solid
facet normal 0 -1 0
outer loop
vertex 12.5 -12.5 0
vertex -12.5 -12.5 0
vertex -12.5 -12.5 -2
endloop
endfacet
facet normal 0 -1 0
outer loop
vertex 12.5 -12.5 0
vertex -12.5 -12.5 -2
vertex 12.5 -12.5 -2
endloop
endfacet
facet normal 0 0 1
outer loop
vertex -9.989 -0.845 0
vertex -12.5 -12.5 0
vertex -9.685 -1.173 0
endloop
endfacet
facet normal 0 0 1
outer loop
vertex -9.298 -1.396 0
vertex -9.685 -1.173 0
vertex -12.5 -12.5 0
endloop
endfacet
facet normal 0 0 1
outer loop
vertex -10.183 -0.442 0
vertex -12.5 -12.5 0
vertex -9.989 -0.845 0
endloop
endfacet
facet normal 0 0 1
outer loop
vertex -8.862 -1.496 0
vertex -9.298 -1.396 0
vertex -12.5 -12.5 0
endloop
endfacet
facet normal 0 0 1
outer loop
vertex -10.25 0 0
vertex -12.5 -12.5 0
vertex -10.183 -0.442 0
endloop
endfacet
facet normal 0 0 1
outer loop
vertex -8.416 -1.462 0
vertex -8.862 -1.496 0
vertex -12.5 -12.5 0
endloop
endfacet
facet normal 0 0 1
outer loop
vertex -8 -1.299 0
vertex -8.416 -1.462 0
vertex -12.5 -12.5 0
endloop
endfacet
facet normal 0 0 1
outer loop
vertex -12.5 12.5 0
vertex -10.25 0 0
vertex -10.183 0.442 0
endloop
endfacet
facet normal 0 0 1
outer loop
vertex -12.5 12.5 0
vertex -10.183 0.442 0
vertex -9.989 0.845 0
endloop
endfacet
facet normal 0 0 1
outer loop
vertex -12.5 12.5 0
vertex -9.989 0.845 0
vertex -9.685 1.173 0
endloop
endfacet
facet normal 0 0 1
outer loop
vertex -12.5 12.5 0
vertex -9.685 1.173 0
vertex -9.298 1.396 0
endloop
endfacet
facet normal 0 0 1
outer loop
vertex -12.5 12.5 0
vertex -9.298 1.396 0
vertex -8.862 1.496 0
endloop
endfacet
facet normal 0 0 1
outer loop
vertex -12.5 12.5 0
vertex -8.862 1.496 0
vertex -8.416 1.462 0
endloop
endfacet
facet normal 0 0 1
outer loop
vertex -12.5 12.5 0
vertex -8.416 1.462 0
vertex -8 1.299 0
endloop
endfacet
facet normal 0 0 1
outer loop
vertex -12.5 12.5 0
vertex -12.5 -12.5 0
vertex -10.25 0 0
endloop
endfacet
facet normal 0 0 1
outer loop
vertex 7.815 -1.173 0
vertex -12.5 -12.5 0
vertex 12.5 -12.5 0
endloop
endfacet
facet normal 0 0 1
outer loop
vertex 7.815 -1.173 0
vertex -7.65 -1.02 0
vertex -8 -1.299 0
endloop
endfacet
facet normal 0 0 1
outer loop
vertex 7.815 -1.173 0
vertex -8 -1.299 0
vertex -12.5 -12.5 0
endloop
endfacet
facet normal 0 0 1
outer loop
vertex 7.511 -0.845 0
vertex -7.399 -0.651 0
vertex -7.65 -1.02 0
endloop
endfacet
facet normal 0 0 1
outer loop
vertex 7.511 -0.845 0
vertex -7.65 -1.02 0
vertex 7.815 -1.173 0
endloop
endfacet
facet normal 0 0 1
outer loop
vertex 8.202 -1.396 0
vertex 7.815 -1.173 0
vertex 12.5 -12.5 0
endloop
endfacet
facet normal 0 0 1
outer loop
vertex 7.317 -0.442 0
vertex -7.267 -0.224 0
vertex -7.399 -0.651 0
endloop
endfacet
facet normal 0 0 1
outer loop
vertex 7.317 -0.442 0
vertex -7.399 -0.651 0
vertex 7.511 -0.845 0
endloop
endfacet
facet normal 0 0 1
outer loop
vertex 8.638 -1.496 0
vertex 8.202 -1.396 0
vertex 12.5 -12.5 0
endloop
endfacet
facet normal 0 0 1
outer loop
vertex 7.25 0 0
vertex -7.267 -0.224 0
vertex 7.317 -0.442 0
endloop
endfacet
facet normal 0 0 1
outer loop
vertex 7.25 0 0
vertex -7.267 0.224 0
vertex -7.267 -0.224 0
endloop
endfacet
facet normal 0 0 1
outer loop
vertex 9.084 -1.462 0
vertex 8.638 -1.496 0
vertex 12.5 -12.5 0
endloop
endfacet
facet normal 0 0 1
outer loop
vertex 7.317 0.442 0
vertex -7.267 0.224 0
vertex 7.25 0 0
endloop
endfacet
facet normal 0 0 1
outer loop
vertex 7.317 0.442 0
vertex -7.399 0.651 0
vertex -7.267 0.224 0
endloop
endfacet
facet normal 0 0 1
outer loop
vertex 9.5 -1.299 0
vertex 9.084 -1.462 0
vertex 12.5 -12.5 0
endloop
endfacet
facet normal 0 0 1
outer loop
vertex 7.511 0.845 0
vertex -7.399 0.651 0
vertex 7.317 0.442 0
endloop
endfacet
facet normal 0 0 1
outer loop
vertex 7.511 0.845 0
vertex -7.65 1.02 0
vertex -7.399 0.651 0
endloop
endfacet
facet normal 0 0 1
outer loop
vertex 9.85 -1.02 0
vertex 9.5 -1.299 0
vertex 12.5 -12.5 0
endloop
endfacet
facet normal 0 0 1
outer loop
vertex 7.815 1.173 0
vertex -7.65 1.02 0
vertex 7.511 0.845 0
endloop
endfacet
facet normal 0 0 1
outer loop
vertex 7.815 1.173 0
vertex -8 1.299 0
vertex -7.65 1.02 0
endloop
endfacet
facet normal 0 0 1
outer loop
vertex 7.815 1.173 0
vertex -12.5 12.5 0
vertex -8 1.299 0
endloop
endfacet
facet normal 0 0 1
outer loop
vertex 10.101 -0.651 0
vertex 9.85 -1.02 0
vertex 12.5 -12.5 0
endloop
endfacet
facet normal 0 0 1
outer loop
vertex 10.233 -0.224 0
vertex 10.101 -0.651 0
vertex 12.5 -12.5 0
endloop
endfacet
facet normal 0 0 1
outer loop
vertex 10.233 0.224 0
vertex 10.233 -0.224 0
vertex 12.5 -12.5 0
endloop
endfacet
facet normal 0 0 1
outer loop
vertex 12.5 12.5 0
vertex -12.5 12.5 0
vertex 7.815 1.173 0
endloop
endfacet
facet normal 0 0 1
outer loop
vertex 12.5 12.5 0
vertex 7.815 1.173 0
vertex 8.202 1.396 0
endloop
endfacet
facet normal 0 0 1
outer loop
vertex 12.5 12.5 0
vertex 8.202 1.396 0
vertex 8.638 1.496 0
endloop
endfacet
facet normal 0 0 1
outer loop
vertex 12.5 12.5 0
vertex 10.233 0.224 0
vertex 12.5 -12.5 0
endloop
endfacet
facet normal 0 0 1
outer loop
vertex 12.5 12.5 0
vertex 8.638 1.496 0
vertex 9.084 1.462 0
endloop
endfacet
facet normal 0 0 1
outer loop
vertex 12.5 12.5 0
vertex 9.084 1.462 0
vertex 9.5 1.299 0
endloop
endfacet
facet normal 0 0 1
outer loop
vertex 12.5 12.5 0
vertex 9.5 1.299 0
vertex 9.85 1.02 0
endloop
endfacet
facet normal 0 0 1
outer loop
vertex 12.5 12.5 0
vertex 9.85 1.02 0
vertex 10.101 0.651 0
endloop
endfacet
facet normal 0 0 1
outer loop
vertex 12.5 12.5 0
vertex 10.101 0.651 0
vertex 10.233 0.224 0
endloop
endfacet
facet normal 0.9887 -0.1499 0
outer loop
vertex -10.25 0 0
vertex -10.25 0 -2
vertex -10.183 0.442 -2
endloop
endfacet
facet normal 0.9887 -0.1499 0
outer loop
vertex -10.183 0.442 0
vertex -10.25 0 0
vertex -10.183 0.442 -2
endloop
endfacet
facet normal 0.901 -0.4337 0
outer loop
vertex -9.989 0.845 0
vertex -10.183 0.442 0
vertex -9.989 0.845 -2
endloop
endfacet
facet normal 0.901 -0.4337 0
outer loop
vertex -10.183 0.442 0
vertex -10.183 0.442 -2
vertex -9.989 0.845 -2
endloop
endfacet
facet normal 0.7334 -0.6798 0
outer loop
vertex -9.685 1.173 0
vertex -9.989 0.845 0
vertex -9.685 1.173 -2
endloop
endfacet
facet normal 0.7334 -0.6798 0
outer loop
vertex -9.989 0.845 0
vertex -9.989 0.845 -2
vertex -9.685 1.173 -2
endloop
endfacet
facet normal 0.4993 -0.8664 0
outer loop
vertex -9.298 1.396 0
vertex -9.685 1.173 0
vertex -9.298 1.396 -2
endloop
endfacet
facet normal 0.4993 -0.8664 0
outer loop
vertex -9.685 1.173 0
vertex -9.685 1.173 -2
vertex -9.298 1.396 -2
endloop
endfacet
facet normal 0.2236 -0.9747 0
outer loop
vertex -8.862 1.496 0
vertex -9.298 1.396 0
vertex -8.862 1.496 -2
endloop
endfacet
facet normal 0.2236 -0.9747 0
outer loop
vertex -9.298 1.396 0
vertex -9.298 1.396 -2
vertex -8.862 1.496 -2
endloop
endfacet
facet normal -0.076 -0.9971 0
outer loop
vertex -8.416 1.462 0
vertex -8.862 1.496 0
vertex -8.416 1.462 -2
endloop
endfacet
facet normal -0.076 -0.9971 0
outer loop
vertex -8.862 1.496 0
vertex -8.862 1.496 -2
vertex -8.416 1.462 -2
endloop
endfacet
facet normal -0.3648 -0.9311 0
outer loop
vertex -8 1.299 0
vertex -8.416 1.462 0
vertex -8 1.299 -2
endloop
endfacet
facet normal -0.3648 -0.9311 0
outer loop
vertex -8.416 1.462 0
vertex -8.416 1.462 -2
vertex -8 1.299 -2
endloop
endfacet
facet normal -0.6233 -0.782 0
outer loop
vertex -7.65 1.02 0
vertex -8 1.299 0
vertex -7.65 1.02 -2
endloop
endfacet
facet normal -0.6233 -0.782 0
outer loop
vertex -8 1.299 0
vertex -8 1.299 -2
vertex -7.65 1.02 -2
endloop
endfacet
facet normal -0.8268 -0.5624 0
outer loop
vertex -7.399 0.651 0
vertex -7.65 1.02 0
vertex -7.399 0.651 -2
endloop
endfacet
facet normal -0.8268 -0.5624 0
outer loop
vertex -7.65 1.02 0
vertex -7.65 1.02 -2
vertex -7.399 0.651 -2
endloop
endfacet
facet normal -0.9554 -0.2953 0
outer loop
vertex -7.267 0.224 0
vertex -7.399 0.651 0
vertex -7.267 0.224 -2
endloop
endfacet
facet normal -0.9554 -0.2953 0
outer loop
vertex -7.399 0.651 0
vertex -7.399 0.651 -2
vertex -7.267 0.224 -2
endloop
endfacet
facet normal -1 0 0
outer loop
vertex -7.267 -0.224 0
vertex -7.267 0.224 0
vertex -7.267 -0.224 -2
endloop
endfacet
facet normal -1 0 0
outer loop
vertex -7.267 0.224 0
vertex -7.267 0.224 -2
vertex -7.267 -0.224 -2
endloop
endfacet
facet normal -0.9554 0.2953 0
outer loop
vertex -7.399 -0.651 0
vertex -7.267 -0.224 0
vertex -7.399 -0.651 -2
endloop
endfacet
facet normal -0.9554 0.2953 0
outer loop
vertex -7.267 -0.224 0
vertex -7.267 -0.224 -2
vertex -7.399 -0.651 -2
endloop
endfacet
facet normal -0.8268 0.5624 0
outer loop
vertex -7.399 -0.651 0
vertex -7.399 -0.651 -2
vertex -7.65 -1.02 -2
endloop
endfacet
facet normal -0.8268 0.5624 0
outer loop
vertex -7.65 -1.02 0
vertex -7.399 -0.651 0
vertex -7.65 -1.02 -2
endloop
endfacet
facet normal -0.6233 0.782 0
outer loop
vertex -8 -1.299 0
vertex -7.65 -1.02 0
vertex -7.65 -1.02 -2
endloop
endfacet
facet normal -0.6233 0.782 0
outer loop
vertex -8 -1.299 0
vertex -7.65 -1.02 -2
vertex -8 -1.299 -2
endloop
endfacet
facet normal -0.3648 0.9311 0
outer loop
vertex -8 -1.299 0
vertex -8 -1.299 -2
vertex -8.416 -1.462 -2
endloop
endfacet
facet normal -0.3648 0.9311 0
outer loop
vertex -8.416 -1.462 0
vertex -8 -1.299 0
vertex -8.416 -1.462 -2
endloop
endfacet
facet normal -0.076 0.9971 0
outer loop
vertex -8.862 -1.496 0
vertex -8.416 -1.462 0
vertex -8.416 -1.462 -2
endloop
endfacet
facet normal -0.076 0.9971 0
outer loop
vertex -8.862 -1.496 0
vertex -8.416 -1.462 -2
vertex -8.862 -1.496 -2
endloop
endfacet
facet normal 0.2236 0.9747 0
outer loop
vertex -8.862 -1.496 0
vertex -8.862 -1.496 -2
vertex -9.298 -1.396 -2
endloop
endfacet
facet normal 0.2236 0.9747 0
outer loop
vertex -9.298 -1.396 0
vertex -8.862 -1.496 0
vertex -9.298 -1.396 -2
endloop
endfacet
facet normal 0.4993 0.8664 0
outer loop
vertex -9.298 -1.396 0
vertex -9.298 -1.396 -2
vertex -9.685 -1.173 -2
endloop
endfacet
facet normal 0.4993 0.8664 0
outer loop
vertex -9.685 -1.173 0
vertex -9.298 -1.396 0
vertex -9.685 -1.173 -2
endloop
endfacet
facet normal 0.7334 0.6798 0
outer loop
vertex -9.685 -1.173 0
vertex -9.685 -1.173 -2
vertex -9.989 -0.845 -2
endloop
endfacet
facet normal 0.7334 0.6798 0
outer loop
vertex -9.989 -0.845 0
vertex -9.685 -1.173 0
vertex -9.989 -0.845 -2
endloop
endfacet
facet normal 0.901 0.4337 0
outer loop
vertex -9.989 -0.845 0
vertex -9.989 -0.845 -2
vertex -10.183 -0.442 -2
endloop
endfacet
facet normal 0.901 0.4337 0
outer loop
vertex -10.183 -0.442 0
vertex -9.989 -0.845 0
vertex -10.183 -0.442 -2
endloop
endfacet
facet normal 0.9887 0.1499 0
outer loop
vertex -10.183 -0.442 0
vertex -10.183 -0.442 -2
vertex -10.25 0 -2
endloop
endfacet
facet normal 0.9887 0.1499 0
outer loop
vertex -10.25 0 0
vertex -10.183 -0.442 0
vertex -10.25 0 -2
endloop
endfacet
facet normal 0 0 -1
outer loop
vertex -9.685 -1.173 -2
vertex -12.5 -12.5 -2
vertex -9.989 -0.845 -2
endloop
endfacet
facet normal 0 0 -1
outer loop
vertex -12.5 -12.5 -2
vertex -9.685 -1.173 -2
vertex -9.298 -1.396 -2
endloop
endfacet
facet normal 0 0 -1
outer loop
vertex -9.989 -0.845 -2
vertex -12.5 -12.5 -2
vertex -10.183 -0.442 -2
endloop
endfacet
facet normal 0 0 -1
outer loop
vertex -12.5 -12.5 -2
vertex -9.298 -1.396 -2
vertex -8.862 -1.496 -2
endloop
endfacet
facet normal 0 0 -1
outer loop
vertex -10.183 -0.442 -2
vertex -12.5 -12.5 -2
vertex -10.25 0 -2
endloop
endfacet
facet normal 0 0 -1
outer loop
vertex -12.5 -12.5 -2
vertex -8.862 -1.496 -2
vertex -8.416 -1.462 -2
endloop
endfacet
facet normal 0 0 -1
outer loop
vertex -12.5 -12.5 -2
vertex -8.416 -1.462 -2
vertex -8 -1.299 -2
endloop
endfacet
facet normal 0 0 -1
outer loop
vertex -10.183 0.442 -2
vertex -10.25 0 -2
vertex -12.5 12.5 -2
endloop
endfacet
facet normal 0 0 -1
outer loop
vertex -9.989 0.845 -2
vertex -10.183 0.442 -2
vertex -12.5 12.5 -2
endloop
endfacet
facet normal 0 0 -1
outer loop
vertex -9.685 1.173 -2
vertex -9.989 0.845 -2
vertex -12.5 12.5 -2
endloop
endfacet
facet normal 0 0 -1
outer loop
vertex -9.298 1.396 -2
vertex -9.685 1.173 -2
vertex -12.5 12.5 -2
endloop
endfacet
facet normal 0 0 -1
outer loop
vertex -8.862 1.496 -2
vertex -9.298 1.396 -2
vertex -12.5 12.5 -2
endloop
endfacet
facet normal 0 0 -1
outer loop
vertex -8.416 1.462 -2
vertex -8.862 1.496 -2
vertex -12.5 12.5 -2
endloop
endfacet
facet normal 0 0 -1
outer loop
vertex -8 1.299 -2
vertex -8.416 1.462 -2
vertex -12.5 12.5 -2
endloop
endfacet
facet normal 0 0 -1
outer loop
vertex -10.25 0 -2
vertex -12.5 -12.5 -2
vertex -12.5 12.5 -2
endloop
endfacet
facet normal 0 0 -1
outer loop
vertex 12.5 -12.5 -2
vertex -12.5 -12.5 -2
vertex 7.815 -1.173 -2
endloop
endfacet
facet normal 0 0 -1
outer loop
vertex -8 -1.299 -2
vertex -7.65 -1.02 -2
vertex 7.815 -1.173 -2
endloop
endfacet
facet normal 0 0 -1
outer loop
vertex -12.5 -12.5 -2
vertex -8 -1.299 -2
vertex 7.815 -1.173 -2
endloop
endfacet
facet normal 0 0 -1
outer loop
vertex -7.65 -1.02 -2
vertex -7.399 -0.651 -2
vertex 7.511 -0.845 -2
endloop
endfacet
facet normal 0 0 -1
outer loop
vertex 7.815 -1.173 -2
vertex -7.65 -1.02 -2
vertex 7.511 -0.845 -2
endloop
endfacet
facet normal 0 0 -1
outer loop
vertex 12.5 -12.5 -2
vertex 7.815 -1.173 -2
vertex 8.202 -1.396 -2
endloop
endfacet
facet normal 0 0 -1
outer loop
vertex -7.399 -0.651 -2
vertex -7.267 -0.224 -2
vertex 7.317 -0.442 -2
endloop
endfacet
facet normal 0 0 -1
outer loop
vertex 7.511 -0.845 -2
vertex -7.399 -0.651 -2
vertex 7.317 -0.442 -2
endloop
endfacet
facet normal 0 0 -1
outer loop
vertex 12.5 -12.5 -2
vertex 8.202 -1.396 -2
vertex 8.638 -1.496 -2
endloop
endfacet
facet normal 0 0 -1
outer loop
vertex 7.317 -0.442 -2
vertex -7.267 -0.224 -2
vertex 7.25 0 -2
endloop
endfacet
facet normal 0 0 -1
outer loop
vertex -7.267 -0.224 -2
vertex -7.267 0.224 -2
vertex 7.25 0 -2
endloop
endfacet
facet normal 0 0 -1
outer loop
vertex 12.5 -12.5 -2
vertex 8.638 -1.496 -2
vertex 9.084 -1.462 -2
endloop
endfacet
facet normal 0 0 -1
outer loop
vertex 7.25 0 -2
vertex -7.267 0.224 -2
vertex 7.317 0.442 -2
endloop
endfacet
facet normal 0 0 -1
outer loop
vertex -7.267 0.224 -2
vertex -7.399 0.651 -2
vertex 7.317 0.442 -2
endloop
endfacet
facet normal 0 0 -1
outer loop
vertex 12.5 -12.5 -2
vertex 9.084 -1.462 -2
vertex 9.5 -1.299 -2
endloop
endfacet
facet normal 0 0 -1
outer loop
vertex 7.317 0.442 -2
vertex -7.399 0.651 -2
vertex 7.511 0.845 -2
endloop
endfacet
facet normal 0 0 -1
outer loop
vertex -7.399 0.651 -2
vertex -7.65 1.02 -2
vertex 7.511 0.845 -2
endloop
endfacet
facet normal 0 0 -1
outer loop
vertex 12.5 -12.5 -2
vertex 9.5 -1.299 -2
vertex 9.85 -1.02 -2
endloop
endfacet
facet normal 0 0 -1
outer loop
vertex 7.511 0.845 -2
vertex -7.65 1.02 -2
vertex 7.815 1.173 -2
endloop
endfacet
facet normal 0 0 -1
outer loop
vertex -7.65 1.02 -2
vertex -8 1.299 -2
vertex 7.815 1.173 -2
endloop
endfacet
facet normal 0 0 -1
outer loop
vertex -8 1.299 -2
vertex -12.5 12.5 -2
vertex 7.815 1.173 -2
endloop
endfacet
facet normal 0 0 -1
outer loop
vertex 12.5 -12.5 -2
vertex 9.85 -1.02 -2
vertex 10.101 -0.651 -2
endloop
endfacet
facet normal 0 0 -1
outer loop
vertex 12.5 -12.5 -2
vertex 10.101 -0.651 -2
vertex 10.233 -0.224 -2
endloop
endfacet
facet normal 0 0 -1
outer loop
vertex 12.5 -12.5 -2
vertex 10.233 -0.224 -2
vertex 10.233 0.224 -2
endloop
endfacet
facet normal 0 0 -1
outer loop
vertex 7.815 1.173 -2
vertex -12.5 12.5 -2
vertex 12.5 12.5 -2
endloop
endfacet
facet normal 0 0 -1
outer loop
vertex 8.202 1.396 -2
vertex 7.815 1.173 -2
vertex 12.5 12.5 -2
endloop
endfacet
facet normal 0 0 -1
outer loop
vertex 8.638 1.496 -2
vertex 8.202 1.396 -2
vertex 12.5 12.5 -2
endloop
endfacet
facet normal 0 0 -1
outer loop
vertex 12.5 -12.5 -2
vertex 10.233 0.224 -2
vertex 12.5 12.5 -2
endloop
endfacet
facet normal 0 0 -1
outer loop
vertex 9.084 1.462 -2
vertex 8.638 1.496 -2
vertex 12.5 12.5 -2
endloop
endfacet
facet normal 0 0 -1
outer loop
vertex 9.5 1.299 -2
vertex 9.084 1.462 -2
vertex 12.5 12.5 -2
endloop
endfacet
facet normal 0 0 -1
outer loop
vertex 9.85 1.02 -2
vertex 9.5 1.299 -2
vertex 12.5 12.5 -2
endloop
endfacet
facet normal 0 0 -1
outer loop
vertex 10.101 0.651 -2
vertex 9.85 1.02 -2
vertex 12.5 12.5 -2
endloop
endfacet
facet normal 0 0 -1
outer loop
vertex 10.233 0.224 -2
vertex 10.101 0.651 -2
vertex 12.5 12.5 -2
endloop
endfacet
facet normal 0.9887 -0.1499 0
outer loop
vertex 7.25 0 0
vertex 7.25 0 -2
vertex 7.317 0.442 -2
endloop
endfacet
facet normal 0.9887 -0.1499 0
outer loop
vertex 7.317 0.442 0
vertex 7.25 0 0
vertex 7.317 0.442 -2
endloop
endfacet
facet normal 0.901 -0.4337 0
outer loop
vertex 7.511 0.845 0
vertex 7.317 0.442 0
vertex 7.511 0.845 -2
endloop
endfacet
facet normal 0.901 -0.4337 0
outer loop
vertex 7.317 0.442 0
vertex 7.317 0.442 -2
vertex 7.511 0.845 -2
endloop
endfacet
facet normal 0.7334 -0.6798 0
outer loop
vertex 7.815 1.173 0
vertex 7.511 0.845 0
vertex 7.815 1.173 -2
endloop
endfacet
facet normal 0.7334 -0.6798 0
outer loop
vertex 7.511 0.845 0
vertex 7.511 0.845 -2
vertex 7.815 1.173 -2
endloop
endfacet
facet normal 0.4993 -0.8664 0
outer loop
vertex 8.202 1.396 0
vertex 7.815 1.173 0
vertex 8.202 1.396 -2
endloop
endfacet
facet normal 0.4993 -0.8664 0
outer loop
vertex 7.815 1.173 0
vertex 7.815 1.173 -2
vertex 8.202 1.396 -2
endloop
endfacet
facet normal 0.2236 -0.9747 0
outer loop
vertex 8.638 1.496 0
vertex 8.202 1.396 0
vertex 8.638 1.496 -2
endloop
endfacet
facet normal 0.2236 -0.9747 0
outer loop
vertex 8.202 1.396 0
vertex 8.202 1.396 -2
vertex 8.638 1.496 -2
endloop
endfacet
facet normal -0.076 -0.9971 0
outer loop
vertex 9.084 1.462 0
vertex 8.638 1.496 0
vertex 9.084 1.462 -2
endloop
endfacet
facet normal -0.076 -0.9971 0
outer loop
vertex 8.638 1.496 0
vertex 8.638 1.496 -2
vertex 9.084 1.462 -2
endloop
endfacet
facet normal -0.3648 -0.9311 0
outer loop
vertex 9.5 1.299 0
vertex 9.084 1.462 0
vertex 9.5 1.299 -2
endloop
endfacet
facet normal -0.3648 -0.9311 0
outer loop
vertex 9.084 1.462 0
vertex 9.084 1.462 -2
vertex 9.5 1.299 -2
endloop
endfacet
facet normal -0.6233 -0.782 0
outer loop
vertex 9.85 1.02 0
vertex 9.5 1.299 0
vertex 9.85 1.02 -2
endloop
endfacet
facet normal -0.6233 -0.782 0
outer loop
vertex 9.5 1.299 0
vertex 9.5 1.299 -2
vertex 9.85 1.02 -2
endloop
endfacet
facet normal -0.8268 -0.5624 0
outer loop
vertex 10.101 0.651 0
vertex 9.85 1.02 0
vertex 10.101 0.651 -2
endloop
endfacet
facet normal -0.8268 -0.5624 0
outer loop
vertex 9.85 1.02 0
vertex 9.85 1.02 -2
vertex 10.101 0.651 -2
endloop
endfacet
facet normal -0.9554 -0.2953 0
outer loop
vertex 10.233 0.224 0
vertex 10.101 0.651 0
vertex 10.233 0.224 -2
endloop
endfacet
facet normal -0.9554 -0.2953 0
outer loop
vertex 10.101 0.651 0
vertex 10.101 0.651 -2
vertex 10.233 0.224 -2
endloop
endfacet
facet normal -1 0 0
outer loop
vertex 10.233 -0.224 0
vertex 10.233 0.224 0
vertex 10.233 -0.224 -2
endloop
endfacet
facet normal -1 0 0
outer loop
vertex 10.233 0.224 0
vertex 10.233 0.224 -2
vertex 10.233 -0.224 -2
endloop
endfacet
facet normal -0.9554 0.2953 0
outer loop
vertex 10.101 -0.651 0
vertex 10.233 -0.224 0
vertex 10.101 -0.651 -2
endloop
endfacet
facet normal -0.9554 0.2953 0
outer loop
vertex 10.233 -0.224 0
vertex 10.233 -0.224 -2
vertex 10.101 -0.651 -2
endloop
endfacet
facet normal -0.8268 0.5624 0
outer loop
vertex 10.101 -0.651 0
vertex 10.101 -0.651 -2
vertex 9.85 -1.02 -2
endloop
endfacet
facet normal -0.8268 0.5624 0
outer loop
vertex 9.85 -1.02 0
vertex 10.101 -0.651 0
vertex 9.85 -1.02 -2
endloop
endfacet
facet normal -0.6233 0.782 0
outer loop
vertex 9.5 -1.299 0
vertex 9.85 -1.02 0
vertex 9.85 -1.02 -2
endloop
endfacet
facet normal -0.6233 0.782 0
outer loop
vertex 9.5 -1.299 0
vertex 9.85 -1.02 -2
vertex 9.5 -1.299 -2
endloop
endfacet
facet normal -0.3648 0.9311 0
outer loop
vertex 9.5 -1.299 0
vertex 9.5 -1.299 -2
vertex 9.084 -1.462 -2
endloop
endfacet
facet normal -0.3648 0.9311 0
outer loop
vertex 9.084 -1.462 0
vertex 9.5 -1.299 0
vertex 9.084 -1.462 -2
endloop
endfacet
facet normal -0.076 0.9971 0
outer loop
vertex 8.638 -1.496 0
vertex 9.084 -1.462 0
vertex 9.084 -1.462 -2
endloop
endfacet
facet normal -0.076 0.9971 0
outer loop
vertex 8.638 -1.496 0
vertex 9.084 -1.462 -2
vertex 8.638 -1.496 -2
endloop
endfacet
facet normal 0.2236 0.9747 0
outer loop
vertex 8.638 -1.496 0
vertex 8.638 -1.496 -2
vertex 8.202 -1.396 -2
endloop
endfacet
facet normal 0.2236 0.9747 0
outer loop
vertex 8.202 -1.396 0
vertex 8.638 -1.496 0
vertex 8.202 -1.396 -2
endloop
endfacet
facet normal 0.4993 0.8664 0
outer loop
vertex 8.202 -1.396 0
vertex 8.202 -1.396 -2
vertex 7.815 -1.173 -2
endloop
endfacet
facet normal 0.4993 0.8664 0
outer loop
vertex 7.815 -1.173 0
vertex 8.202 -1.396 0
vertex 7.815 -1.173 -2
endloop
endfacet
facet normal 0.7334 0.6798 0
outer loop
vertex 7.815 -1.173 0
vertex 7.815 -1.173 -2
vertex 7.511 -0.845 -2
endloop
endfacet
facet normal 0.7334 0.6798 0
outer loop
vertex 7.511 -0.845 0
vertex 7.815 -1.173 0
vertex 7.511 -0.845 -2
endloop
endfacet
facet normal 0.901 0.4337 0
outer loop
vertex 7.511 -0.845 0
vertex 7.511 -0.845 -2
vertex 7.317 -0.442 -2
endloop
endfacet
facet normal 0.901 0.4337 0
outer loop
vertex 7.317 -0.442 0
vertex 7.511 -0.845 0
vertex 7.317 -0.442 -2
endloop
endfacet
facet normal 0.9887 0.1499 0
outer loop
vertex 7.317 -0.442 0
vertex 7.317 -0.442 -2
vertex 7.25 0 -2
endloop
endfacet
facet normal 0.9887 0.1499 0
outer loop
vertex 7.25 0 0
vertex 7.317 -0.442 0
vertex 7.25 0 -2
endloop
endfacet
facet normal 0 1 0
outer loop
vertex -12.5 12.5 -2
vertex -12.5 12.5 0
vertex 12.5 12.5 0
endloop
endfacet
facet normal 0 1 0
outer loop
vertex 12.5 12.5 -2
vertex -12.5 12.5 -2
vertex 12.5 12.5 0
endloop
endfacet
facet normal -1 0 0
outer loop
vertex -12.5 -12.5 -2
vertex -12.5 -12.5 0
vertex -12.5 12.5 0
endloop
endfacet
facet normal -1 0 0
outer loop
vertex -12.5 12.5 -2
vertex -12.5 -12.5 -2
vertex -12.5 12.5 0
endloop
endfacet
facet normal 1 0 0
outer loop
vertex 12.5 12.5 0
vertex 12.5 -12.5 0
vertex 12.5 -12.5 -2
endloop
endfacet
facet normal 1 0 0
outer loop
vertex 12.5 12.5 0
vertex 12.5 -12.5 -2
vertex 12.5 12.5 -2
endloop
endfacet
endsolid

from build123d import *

# Parameters (mm, degrees)
F0_W     = 25
F0_H     = 25
F1_DEPTH = 2
F2_D     = 3


with BuildPart() as f1:
    # F0 (on Top) → F1 (new body)
    with BuildSketch(Plane.XY):
        Rectangle(F0_W, F0_H)
    extrude(amount=-F1_DEPTH)

    # F2 (through all)
    with Locations(Plane.XY):
        with Locations((-8.75, 0), (8.75, 0)):
            Hole(F2_D / 2)


solid = f1.part
